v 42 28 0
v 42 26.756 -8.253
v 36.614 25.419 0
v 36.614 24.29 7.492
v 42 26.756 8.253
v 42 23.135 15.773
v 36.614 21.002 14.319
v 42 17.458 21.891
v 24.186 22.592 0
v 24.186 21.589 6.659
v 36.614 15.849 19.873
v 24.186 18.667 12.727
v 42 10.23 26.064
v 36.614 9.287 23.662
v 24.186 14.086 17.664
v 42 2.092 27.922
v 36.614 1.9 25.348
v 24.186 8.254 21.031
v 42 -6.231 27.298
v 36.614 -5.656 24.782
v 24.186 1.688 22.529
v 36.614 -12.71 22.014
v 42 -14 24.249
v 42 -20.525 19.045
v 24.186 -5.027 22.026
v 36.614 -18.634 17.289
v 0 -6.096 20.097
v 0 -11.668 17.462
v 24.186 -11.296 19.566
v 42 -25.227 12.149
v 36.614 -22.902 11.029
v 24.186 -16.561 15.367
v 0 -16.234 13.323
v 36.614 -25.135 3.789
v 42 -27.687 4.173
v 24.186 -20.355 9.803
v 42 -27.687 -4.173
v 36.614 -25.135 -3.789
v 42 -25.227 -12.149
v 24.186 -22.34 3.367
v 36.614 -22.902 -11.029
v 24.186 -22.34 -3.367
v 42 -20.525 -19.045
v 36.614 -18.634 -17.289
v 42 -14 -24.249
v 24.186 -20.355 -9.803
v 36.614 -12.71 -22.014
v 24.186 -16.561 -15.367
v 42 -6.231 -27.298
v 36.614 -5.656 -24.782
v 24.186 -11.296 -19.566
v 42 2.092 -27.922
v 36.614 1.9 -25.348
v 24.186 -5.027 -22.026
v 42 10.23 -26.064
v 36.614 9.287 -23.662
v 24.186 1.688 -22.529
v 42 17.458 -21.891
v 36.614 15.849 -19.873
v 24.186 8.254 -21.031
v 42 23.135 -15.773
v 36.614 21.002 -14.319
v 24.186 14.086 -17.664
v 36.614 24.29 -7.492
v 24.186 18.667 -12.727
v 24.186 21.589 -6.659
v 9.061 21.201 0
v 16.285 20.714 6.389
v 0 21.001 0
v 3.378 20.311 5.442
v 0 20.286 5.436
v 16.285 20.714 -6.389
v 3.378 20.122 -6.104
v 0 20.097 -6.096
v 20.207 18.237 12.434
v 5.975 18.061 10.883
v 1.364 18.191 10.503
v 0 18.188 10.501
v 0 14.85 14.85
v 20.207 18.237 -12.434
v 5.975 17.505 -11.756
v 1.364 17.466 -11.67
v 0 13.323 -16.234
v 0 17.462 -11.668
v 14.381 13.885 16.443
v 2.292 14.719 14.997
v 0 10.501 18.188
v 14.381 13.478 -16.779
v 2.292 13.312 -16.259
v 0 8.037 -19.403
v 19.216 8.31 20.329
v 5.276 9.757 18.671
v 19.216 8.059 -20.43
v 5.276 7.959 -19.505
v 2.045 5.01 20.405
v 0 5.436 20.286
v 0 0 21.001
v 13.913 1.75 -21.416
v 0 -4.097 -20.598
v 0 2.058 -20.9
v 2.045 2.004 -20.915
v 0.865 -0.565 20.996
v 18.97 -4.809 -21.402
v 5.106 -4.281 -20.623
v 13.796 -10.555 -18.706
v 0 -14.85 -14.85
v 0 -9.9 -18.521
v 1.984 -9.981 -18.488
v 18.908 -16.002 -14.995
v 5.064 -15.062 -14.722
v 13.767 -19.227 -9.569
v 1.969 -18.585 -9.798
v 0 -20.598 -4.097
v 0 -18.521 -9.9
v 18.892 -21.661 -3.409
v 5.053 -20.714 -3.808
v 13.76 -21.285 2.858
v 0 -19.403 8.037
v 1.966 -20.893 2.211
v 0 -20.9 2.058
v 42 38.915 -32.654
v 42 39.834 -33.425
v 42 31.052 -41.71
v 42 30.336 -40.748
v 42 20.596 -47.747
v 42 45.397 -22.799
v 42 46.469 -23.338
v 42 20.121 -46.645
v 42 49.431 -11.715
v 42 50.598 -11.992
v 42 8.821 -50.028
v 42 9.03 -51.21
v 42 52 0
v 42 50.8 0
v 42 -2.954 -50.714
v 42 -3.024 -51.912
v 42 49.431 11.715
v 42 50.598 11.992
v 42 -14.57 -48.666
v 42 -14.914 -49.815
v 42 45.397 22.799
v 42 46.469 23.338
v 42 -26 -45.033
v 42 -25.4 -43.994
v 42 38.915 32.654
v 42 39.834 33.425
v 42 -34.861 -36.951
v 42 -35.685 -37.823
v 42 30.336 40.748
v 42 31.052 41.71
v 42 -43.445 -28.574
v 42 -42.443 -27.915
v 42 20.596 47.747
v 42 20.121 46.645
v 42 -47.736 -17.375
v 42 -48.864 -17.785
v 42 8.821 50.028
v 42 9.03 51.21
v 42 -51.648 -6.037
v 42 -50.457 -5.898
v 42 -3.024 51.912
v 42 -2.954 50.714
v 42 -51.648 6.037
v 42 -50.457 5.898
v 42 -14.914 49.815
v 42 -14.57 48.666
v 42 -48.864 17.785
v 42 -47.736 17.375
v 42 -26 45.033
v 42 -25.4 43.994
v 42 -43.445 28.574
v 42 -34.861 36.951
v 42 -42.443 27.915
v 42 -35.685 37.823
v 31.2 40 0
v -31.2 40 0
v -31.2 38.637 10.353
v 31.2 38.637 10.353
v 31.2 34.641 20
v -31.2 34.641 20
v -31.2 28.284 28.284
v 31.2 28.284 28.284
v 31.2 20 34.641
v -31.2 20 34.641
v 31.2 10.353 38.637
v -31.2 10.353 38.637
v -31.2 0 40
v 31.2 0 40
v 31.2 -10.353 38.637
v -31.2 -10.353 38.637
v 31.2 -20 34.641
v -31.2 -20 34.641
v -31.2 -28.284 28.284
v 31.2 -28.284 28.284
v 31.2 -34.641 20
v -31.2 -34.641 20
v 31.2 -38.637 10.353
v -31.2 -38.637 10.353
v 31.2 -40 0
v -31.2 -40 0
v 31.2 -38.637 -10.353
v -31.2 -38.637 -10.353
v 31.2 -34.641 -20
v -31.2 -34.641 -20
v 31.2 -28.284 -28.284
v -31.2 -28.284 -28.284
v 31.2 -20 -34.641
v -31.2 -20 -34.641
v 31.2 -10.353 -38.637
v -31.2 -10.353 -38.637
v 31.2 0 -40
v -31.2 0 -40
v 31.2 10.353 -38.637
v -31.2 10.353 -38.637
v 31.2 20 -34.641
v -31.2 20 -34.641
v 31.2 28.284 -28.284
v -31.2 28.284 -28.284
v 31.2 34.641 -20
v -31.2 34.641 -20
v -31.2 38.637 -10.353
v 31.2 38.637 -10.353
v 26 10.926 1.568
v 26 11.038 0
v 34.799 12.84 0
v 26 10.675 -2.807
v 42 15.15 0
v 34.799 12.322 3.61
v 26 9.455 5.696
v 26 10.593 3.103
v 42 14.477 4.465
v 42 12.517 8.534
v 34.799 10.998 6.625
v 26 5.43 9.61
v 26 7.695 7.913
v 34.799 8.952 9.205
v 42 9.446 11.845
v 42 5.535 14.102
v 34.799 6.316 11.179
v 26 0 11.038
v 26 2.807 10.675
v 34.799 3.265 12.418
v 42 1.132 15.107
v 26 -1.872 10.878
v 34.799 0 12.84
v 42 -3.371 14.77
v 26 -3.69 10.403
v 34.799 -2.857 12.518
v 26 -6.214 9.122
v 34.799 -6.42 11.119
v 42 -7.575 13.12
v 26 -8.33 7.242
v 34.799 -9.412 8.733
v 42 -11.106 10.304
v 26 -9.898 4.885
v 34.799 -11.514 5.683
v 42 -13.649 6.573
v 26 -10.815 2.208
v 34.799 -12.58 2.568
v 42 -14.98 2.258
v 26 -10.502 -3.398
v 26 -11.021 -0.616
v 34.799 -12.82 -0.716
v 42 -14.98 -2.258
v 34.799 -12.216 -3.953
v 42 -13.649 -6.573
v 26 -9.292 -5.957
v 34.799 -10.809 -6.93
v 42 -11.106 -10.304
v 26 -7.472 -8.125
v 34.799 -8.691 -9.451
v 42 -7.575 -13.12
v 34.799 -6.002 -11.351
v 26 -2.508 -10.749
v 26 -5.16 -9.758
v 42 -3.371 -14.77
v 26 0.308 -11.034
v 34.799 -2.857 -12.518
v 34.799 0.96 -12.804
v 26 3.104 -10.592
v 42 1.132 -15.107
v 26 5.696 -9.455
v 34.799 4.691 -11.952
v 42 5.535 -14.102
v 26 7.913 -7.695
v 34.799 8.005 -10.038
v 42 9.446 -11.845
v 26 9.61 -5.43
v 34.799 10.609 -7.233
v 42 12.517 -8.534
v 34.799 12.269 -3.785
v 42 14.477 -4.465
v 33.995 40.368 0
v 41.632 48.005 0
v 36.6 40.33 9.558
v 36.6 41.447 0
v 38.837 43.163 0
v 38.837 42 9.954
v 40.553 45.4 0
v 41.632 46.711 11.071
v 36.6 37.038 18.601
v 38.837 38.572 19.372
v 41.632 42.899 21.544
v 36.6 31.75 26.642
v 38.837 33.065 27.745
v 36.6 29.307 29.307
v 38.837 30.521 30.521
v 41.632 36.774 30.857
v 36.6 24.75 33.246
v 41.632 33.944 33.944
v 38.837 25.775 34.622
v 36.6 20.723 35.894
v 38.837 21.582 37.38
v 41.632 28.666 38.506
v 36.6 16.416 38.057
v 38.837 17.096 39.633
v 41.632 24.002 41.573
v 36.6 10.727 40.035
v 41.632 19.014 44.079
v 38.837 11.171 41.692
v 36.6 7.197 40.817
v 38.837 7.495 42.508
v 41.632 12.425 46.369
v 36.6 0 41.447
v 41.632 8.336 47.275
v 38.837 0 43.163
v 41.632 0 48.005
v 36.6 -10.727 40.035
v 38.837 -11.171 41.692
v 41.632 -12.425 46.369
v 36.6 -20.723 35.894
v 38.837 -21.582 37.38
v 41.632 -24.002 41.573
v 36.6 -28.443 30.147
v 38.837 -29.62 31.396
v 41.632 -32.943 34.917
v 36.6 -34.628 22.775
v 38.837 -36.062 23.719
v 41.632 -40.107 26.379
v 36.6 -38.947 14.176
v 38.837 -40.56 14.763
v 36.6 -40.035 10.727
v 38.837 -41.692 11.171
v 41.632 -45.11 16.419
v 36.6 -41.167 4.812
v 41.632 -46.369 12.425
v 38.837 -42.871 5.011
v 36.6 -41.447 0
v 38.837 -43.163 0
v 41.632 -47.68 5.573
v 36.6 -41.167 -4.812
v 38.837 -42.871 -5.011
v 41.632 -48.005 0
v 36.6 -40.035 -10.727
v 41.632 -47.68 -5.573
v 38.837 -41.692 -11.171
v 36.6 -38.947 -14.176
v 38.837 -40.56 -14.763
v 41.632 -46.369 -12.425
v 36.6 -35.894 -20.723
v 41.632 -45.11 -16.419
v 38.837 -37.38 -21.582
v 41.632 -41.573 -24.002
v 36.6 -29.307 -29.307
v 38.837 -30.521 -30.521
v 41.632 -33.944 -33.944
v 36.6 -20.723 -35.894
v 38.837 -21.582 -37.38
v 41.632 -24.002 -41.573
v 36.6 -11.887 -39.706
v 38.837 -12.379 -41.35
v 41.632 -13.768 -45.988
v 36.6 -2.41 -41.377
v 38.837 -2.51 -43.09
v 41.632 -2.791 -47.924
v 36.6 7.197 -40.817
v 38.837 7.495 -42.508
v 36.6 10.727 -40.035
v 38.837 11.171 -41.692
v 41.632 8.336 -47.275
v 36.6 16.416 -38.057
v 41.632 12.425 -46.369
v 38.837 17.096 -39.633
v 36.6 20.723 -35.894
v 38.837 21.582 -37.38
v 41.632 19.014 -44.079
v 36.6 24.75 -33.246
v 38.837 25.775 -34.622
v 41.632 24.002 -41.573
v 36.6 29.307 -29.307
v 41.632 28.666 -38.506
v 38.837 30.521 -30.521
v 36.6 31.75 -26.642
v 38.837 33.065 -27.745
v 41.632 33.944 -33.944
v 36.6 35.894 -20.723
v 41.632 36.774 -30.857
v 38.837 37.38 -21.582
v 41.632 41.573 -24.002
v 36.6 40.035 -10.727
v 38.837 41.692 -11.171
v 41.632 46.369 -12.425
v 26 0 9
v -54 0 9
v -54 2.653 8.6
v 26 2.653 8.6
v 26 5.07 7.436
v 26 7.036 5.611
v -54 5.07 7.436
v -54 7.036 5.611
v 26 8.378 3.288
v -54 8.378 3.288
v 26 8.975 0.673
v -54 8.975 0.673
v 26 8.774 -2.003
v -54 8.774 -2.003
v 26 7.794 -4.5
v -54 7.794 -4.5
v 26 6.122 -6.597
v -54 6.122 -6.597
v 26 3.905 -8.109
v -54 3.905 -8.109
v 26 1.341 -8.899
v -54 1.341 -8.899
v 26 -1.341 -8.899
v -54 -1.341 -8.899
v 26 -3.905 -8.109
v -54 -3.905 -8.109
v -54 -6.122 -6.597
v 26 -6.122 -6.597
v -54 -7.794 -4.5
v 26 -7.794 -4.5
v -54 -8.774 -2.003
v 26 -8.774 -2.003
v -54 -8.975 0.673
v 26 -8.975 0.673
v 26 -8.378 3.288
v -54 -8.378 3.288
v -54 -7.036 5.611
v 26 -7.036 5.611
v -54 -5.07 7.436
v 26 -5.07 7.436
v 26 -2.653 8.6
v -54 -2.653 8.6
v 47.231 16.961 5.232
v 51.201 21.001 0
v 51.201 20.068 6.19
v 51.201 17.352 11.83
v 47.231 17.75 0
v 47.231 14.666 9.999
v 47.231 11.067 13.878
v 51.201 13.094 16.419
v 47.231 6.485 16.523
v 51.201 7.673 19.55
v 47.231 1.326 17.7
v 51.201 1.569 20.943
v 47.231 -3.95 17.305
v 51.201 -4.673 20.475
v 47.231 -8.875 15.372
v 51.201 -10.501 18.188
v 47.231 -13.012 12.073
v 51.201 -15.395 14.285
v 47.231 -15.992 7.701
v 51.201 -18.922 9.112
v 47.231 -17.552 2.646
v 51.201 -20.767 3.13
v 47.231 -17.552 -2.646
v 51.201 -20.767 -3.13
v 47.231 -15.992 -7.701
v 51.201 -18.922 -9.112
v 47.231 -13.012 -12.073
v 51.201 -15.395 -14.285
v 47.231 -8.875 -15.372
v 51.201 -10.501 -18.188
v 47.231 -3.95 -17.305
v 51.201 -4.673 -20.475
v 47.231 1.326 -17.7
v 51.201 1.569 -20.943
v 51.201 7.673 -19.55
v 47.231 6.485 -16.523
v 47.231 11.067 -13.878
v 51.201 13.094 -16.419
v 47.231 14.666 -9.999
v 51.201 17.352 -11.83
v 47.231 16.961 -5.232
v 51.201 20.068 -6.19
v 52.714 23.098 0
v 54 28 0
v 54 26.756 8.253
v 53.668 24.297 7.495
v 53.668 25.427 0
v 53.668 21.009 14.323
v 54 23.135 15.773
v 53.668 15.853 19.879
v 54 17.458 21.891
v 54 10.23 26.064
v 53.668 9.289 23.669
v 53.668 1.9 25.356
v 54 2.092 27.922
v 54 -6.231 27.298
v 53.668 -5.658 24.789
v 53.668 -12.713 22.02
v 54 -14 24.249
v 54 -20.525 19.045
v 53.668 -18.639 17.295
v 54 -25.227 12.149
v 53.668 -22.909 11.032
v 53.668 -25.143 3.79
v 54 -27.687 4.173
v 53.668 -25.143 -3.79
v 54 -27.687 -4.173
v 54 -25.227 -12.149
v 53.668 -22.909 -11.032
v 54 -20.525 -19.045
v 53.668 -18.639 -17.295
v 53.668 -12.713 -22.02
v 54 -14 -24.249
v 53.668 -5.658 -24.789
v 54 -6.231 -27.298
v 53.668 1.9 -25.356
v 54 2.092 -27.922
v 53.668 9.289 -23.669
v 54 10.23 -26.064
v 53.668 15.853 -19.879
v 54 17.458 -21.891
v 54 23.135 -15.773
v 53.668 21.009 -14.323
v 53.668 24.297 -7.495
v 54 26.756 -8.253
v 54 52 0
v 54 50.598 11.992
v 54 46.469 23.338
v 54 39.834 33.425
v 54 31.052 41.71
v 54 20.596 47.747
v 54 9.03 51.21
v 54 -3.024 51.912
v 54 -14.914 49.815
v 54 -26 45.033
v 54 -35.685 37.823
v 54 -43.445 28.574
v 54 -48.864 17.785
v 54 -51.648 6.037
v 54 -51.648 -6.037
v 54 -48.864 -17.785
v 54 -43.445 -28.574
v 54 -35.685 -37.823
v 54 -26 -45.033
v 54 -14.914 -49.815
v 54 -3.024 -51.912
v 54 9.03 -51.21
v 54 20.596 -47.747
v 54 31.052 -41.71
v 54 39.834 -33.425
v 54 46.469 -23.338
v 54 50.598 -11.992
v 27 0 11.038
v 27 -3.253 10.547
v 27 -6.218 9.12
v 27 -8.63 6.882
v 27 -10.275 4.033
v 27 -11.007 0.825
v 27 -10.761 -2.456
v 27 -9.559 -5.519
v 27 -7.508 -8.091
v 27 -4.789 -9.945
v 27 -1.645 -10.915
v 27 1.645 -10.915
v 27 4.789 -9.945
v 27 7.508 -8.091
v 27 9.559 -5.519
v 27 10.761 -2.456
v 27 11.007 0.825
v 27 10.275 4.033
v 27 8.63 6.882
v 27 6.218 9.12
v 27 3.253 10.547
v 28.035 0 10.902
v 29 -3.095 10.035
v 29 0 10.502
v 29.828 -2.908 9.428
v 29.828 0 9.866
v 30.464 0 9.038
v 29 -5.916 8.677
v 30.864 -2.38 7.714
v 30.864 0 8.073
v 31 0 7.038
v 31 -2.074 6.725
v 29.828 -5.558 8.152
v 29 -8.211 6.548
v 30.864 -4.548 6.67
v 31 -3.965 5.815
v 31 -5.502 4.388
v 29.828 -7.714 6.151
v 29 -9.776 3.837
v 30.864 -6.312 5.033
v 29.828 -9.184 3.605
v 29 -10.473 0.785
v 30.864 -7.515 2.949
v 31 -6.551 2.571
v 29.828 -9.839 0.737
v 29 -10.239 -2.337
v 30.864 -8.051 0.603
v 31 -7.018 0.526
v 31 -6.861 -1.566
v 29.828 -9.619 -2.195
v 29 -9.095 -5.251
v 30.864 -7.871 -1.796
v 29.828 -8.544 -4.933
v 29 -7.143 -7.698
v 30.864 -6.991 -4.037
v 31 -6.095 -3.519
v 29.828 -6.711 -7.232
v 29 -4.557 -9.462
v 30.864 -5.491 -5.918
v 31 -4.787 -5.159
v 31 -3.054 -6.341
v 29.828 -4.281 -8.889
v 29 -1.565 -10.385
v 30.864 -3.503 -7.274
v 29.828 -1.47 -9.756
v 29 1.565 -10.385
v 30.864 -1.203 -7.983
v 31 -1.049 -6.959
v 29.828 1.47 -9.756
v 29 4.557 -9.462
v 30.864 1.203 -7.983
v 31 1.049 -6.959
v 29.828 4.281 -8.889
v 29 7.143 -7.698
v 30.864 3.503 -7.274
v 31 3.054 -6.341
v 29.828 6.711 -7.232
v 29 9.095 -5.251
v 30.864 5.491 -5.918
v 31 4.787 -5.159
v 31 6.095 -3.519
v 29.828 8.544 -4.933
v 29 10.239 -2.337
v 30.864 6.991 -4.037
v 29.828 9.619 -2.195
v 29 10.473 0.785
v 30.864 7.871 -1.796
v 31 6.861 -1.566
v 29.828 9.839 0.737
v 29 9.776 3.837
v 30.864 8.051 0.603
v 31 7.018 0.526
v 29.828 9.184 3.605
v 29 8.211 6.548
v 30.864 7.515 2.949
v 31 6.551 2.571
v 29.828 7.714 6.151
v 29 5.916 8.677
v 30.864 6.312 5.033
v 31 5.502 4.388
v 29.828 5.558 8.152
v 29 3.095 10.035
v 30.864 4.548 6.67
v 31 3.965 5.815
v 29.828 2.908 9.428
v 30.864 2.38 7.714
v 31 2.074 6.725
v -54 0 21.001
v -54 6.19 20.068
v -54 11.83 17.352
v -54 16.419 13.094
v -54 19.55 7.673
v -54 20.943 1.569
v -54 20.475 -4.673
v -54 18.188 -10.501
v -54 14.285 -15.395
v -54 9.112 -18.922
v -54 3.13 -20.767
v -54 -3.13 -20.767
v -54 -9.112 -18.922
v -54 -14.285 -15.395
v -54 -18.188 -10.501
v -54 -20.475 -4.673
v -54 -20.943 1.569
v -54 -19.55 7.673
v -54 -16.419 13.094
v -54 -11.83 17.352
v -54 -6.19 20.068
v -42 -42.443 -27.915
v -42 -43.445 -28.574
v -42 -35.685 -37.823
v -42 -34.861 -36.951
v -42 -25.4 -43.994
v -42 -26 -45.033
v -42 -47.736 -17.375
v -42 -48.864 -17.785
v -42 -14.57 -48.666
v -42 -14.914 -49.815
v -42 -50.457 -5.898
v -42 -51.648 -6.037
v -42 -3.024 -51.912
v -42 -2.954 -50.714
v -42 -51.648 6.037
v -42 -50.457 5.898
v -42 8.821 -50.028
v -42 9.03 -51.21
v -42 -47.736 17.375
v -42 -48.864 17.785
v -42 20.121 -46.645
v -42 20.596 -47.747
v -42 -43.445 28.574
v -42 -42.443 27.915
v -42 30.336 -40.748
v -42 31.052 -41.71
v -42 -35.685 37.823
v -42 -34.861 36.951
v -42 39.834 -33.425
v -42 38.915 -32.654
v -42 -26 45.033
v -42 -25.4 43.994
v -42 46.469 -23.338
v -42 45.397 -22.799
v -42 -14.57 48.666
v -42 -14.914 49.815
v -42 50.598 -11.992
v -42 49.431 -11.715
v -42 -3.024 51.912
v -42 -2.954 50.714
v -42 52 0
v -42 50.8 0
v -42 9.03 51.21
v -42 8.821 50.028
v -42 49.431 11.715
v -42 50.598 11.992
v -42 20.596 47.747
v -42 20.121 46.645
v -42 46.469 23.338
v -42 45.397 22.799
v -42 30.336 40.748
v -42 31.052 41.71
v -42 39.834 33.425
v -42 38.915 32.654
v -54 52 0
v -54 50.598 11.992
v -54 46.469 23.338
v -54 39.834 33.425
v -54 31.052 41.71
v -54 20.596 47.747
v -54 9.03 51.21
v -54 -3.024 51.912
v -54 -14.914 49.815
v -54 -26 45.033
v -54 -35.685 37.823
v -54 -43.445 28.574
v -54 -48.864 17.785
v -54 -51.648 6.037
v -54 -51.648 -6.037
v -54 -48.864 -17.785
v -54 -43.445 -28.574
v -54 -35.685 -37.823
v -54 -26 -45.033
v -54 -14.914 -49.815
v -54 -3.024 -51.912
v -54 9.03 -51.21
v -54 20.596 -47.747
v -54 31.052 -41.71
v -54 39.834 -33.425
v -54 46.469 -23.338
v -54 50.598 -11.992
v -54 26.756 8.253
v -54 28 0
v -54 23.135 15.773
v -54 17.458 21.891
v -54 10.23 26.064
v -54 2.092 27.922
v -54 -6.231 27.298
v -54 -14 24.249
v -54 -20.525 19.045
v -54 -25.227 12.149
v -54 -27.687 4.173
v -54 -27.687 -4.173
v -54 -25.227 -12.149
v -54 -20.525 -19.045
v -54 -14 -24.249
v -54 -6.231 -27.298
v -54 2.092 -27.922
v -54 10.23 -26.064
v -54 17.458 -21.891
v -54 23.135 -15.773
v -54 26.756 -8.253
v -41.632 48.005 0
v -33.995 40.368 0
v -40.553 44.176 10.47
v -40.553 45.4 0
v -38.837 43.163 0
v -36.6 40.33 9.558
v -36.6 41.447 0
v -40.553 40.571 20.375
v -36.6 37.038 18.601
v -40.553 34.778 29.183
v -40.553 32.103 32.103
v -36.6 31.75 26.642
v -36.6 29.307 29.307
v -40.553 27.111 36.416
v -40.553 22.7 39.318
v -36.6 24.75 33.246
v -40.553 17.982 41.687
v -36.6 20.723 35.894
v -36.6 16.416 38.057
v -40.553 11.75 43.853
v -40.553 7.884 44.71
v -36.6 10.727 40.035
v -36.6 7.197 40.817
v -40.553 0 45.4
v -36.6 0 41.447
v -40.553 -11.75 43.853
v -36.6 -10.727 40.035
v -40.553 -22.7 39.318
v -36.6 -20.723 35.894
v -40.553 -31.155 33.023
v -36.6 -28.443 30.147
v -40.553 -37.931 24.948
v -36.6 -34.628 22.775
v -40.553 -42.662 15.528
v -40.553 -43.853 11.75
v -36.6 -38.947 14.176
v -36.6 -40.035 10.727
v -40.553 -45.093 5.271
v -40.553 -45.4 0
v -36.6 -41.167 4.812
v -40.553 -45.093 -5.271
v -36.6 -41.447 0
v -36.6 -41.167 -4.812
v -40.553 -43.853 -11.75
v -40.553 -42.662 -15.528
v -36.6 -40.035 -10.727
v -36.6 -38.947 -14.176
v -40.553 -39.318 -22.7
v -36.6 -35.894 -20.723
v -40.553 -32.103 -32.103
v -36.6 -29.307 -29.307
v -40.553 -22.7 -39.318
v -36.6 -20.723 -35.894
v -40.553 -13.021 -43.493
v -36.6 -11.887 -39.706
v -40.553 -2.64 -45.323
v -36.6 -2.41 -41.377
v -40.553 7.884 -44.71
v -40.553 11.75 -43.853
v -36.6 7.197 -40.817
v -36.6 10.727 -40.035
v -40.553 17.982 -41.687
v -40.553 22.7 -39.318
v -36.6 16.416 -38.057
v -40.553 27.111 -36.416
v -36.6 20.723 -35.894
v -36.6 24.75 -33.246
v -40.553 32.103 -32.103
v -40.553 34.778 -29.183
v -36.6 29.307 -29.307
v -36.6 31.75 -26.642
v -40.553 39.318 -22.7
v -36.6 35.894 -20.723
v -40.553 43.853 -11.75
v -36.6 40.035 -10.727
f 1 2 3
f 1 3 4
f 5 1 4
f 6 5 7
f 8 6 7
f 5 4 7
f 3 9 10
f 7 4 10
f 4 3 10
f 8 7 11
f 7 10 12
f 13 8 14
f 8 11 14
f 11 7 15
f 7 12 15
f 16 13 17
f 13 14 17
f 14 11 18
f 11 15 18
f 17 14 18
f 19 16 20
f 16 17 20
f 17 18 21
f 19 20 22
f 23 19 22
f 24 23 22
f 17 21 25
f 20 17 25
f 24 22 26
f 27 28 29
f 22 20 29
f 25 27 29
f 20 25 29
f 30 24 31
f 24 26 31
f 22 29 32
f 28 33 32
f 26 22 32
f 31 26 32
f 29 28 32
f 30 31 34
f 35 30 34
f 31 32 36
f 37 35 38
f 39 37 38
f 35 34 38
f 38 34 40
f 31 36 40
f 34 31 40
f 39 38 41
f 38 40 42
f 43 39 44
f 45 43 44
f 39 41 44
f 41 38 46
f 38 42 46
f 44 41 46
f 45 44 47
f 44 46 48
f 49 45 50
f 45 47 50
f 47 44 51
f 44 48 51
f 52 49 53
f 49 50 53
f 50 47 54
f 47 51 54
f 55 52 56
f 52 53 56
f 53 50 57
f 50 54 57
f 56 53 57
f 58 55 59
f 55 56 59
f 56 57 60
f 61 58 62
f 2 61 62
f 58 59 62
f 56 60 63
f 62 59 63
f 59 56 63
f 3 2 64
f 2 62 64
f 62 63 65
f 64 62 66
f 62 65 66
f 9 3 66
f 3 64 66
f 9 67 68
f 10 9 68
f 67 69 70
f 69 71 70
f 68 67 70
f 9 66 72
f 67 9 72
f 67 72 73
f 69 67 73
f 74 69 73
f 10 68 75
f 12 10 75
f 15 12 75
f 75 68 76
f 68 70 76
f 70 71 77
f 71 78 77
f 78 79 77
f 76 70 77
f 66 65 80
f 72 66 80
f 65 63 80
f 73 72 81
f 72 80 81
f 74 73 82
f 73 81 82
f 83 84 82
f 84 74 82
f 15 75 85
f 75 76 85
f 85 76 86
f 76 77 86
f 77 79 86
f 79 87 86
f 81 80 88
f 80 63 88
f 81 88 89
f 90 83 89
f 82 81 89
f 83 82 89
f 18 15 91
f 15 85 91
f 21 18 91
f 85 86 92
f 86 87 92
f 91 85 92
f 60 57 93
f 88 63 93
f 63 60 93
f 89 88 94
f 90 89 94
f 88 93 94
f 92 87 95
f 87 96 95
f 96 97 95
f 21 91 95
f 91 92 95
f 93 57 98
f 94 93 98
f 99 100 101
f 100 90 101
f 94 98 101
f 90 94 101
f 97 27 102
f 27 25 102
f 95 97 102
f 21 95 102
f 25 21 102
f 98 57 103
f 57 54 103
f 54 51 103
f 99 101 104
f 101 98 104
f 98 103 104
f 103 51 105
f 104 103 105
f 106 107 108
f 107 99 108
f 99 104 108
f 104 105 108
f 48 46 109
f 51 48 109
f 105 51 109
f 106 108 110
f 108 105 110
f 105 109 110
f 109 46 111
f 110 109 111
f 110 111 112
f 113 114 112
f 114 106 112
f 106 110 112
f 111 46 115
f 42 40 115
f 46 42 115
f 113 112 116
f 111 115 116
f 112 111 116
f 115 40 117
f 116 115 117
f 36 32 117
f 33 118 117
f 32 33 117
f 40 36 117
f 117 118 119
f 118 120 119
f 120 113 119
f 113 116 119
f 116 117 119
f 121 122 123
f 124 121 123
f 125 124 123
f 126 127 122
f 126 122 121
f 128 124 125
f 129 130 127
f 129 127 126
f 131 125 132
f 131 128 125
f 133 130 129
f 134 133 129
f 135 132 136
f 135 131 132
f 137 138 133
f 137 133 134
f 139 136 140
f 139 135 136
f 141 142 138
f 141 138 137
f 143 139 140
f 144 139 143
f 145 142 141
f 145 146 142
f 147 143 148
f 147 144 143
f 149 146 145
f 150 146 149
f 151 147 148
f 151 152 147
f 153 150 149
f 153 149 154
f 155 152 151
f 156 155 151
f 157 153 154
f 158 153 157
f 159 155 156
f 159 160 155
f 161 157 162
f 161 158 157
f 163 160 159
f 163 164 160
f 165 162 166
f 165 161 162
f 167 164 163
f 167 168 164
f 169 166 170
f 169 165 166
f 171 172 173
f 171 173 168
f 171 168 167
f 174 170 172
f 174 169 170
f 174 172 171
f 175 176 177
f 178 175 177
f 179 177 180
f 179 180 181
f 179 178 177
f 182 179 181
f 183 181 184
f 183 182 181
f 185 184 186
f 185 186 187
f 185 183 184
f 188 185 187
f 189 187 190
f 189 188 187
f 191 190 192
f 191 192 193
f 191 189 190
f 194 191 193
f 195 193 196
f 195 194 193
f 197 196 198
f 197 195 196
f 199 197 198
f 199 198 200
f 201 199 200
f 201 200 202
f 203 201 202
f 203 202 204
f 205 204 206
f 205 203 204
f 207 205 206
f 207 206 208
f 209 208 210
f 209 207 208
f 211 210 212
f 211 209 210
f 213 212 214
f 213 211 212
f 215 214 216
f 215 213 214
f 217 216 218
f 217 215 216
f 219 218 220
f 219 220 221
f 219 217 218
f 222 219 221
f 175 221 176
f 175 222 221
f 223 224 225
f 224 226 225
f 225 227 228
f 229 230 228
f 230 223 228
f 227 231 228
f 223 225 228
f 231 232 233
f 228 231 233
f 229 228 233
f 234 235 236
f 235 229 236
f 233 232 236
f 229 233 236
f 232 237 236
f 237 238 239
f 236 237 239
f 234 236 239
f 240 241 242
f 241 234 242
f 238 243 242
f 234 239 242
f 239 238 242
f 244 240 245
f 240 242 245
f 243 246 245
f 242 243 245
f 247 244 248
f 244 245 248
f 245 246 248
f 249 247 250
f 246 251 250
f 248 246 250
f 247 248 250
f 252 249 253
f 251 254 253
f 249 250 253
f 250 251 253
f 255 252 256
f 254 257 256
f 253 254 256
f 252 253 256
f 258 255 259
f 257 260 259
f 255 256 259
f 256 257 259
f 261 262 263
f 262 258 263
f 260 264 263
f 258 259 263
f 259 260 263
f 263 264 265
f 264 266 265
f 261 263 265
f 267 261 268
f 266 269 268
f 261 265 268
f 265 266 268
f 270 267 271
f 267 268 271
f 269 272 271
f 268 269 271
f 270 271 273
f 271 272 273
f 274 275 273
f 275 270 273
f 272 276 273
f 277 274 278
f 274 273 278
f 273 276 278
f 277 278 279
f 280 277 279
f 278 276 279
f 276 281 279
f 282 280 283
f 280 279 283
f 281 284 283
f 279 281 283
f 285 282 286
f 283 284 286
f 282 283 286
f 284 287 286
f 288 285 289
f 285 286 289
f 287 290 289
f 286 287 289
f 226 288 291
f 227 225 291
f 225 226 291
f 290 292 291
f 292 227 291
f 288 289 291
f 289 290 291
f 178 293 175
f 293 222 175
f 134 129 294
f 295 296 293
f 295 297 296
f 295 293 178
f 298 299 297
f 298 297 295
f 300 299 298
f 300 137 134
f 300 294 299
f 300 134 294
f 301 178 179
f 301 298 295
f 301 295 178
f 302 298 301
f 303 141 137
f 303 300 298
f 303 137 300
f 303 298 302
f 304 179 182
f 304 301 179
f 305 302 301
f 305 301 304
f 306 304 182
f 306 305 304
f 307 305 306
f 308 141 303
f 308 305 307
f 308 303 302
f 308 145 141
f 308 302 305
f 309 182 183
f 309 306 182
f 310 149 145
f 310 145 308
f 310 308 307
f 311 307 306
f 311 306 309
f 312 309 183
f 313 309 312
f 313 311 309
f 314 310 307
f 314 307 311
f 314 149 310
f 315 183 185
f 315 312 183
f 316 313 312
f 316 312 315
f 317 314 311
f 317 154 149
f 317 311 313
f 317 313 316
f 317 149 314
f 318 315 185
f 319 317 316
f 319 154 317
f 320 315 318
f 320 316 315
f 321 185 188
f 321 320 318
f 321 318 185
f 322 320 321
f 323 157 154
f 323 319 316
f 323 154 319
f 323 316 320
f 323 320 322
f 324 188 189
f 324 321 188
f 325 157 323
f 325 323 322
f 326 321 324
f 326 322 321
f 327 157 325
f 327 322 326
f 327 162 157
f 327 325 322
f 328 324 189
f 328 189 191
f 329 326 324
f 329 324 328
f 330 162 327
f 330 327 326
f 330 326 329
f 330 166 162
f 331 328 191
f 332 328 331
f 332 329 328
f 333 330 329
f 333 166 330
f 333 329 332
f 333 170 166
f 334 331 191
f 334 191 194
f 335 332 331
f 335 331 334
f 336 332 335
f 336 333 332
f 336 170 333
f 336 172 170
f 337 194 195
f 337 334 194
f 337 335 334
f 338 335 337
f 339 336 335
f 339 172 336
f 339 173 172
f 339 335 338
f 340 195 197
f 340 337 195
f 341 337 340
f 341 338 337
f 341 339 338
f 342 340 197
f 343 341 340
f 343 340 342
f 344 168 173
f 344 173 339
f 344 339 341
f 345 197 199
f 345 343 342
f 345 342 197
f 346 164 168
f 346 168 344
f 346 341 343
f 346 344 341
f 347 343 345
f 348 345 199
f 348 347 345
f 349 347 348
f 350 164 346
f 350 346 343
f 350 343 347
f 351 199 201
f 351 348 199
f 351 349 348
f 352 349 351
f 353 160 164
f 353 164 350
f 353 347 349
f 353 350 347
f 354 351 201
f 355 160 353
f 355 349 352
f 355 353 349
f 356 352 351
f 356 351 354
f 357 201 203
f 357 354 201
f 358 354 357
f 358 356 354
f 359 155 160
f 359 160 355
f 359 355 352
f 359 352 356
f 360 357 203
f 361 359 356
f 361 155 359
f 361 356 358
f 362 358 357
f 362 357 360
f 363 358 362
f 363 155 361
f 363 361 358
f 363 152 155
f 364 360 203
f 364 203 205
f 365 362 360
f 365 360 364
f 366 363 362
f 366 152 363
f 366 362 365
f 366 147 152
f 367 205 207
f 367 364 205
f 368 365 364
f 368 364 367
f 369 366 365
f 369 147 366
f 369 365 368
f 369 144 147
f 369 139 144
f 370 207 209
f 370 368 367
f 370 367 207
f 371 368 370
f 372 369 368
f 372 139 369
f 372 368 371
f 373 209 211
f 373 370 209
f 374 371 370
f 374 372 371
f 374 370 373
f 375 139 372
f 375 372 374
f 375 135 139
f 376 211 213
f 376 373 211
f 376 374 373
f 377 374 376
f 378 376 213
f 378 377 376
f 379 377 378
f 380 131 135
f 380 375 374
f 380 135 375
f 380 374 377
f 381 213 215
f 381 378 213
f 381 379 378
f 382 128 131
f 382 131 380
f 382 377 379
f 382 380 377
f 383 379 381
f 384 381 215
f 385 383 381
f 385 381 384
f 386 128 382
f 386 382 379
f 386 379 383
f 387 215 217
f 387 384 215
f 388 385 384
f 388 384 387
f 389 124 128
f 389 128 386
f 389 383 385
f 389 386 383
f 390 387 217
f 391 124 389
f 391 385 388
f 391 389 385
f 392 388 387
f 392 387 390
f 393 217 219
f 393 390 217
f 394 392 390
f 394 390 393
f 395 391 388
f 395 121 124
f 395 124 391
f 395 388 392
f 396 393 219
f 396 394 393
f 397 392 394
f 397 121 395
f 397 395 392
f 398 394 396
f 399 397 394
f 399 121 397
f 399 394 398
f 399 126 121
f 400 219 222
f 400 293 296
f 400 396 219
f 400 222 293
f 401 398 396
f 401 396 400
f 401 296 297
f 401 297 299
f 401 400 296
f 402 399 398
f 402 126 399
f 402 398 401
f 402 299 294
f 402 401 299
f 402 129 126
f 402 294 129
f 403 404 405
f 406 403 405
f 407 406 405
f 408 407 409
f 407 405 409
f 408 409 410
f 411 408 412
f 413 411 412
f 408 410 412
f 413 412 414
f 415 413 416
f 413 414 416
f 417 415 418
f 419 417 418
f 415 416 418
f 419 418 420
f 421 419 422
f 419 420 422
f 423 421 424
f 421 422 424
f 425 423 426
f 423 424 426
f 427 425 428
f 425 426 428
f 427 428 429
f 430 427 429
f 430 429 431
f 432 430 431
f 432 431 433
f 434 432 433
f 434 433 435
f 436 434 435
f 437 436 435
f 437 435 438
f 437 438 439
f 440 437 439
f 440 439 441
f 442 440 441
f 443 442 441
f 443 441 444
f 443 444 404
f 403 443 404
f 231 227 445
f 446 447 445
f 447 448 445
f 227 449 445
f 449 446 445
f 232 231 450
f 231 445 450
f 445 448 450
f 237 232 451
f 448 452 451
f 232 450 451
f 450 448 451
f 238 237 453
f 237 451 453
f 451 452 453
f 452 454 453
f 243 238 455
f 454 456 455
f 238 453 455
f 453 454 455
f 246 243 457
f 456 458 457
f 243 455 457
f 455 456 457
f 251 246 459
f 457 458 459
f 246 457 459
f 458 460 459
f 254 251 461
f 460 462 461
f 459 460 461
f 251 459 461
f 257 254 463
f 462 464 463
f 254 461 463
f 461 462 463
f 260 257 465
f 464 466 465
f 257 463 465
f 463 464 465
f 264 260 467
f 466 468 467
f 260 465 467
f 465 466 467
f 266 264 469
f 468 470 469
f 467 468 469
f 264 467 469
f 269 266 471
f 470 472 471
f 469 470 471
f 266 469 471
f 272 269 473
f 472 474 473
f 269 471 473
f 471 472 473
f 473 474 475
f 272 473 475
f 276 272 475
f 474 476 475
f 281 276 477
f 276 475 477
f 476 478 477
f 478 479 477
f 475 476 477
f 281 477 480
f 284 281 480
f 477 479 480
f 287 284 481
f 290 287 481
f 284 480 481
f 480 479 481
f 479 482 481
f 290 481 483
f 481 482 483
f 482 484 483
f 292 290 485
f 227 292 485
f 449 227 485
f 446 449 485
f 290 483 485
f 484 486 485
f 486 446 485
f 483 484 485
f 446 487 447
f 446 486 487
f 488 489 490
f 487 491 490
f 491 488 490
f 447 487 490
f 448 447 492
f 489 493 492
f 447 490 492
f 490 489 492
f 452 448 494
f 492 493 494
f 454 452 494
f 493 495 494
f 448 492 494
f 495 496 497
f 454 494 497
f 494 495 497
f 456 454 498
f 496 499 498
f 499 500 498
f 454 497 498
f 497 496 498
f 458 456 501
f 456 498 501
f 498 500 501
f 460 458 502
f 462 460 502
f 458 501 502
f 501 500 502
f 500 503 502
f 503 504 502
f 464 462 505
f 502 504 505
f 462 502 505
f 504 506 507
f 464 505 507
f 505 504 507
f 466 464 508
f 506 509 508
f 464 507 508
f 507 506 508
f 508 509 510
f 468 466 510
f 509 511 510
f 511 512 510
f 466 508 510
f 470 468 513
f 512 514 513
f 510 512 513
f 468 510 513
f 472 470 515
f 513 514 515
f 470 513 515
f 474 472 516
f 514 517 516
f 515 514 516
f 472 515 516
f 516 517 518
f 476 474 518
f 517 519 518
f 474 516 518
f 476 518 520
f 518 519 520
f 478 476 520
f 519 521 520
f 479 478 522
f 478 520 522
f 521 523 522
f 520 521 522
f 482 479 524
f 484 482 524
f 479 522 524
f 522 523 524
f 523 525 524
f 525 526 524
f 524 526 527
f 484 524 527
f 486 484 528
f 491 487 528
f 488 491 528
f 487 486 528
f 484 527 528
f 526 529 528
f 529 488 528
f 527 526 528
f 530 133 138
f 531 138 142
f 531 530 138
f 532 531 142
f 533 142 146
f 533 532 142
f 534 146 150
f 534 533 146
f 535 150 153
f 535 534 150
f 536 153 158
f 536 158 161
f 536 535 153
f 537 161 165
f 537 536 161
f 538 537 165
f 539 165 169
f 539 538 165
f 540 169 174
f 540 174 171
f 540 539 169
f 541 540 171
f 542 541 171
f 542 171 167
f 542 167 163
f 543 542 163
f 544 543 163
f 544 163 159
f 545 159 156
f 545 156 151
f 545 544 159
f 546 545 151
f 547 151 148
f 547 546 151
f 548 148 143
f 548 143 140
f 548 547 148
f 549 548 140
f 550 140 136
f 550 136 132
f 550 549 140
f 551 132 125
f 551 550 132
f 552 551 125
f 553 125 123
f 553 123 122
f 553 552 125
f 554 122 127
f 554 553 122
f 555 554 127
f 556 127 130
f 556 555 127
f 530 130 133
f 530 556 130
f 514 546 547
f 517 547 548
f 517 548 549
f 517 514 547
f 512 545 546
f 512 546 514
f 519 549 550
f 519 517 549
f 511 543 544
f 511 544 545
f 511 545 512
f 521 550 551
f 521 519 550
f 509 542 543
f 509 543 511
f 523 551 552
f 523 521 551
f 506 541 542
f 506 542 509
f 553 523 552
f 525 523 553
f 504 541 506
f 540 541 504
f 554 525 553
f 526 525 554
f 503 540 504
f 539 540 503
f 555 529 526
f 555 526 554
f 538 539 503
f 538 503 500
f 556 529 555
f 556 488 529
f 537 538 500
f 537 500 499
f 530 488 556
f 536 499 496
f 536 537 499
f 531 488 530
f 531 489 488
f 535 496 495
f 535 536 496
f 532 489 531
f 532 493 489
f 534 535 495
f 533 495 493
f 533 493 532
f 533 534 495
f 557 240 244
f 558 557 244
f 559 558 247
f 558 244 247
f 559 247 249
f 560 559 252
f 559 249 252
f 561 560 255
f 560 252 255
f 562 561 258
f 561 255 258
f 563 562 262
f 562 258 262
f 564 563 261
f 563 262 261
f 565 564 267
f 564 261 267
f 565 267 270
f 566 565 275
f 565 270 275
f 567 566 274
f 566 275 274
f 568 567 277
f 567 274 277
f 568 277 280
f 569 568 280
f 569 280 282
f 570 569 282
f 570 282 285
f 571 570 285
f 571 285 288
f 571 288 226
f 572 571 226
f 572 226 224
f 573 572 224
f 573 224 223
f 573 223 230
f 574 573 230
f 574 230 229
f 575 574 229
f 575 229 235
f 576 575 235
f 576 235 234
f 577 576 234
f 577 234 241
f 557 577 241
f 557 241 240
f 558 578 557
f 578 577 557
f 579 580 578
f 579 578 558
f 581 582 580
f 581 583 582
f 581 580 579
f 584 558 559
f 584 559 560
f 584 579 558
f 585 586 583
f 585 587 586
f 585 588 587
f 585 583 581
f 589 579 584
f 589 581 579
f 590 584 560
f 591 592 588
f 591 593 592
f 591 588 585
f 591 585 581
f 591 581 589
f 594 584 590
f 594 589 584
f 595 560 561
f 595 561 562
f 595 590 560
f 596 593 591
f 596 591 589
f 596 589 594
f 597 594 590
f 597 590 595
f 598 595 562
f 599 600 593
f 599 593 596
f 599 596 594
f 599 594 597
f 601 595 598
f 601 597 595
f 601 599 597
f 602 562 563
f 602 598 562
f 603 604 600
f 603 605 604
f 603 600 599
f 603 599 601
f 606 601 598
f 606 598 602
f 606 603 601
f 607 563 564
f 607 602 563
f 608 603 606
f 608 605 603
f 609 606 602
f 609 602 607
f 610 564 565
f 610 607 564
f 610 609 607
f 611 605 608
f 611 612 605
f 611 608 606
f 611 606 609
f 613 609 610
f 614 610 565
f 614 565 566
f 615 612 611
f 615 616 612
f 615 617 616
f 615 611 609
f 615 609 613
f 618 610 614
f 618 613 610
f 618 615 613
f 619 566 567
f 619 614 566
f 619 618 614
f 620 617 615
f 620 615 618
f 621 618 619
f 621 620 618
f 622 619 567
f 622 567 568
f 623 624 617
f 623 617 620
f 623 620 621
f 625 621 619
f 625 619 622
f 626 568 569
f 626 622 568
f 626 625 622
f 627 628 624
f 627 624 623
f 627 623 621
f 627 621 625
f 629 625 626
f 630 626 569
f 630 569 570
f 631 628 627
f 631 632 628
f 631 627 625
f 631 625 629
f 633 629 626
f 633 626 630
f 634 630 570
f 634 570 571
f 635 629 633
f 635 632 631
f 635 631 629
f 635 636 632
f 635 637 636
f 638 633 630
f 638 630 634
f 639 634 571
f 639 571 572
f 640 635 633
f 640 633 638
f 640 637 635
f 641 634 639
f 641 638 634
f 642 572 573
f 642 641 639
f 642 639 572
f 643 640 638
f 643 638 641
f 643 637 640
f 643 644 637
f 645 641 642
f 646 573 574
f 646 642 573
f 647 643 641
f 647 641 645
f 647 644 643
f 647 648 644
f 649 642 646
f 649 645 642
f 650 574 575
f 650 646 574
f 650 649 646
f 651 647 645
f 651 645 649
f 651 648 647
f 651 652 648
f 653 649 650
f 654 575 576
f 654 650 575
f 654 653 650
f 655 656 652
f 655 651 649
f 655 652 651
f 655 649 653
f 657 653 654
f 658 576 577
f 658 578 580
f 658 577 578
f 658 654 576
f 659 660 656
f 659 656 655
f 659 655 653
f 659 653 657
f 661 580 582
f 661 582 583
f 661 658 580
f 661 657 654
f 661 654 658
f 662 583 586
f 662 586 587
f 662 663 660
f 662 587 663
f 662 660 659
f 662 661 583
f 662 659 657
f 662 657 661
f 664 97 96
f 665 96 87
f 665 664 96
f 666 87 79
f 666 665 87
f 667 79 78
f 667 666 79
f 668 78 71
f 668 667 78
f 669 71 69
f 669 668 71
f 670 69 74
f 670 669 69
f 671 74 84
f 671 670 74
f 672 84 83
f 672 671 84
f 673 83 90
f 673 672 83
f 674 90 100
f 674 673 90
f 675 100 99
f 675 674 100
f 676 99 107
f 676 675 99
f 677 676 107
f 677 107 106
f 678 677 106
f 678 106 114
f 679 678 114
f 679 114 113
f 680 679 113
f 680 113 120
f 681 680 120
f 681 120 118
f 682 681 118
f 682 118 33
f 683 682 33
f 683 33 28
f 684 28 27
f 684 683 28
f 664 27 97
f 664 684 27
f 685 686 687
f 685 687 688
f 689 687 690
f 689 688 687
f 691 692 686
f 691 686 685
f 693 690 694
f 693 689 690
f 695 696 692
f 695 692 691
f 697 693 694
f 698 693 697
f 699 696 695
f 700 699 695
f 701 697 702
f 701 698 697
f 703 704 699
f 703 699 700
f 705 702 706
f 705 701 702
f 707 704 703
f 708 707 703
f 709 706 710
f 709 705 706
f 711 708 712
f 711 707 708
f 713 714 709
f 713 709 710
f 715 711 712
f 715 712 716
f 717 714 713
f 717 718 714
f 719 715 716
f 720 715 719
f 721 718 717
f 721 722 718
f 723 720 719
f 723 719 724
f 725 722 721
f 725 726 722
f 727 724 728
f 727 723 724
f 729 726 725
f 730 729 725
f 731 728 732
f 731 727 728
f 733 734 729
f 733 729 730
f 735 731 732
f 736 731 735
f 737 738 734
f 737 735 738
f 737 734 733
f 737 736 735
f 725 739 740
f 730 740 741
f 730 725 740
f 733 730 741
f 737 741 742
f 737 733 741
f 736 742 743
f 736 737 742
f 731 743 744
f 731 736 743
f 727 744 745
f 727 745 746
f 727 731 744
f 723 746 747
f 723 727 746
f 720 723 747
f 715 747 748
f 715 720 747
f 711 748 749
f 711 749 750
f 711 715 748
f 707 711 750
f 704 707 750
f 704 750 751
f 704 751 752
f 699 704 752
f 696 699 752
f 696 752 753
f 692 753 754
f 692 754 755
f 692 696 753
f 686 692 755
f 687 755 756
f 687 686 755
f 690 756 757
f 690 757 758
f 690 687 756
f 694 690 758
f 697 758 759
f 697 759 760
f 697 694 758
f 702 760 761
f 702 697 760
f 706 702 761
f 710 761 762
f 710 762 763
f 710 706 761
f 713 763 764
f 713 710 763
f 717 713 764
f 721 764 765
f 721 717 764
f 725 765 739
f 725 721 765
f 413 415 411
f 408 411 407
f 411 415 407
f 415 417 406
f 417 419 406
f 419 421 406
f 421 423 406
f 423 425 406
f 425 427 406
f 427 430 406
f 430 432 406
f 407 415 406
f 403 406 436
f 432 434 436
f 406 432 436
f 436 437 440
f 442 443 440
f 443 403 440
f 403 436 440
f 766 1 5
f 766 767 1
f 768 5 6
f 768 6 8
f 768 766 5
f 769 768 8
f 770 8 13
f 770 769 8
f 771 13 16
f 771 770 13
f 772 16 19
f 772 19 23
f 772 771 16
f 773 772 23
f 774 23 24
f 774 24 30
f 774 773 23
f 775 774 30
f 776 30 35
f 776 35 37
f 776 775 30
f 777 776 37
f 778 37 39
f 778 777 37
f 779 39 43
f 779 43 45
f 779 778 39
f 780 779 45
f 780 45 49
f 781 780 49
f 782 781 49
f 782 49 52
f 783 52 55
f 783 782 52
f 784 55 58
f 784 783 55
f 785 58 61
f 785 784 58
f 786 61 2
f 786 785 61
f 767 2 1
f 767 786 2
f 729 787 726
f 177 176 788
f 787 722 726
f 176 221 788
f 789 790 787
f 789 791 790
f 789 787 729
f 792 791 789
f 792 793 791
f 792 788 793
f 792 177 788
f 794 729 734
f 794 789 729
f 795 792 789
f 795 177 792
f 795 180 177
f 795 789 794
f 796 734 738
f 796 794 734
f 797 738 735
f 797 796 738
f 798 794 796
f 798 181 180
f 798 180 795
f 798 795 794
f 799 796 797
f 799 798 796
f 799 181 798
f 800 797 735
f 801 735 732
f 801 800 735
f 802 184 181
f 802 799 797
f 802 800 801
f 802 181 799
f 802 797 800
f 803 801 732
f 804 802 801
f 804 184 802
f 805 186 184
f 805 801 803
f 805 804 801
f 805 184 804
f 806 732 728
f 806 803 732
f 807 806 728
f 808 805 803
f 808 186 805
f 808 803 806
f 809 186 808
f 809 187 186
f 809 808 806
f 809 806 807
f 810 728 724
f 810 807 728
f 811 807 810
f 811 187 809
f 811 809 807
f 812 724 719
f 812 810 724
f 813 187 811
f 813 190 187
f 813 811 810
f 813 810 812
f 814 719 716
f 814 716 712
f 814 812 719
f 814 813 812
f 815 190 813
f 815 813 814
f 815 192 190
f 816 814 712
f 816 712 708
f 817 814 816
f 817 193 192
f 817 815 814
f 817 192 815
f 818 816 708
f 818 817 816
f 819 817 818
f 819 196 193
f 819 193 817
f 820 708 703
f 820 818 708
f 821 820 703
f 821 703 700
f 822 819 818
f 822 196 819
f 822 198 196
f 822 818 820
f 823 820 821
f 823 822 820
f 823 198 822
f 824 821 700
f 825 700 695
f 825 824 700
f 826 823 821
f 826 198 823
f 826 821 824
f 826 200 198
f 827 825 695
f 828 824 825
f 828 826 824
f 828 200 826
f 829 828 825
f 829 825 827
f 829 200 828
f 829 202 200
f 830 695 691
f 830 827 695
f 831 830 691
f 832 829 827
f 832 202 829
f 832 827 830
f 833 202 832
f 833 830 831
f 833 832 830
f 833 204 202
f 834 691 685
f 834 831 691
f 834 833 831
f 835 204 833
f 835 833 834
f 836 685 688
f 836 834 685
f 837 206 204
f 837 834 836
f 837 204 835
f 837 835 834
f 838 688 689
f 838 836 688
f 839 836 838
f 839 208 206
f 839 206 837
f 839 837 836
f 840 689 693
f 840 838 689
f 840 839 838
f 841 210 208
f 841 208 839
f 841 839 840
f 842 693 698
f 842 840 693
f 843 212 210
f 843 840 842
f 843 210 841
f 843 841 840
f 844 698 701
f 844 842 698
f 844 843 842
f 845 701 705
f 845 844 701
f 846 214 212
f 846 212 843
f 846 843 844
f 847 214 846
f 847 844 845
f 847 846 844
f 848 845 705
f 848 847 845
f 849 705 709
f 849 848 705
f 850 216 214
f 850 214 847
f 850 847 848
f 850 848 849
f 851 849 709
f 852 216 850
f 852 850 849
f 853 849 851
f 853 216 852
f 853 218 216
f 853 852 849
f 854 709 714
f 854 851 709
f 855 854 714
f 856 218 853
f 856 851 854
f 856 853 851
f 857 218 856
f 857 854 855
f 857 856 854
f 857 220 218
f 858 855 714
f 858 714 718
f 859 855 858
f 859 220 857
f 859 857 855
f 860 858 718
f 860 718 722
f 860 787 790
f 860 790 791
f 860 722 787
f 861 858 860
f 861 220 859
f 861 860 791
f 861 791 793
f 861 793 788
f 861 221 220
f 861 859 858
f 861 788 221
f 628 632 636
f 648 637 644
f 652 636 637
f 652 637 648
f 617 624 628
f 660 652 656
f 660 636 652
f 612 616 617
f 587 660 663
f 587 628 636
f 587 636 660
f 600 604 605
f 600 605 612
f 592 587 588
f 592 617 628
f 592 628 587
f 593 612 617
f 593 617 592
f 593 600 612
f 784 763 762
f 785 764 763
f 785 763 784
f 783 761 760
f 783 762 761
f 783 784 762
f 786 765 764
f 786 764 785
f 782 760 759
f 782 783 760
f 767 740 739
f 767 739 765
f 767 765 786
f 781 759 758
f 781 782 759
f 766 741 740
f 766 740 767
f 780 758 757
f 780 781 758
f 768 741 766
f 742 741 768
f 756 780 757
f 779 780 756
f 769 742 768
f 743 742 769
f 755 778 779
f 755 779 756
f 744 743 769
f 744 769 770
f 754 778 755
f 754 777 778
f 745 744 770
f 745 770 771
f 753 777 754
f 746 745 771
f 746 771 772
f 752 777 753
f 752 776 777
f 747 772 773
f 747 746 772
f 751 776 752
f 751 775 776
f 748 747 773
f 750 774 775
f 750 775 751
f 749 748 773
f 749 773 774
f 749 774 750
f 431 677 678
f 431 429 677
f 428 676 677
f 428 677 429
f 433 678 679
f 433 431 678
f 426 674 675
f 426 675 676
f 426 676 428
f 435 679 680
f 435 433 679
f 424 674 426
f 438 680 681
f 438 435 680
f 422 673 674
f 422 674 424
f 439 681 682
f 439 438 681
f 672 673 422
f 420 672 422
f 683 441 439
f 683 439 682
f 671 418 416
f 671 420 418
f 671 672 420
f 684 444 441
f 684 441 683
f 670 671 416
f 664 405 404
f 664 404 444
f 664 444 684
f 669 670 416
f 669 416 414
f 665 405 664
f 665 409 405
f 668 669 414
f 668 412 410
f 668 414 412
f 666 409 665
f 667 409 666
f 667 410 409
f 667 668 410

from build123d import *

# Parameters (mm, degrees)
R_VOLUTION3_OUTLINE_W = 12
R_VOLUTION3_OUTLINE_H = 12
ESQUISSE2_R           = 21.001288109
ESQUISSE2_R_2         = 9
BOSS_EXTRU_1_DEPTH    = 80
ESQUISSE3_R           = 11.037807833
BOSS_EXTRU_2_DEPTH    = 5
CONG_1_R              = 4


# Read off the part's stored shape, not the designer's step: Révolution3
with BuildPart() as part:
    # Révolution3 outline → Révolution3 (revolve)
    with BuildSketch(Plane.YX):
        with BuildLine():
            add(Edge.make_bspline(
                [(9, 0), (9.053826316, 3.507535605), (9.211693628, 27.185630898), (15.14970787, 42)],
                knots=[0, 0, 0, 0, 0.679566397, 0.679566397, 0.679566397, 0.679566397], degree=3))
            Line((9, 0), (21.001288109, 0))
            Line((21.001288109, 0), (21.001288109, 42))
            Line((21.001288109, 42), (15.14970787, 42))
        make_face()
        with BuildLine():
            add(Edge.make_bspline(
                [(15.14970787, 42), (16.682530626, 45.824140722), (18.600512592, 49.057648401), (21.001288109, 51.201106105)],
                knots=[0.679566397, 0.679566397, 0.679566397, 0.679566397, 0.854987808, 0.854987808, 0.854987808, 0.854987808], degree=3))
            Line((15.14970787, 42), (21.001288109, 42))
            Line((21.001288109, 42), (21.001288109, 51.201106105))
        make_face()
        with BuildLine():
            Line((21.001288109, 42), (21.001288109, 0))
            add(Edge.make_bspline(
                [(28, 42), (27.997779305, 41.997025444), (27.875050115, 41.83237842), (27.609034397, 41.447212382), (27.160528215, 40.690969165), (26.526197616, 39.457776411), (25.708310332, 37.527019057), (24.777928166, 34.714134126), (23.942034299, 31.528478566), (22.978703398, 26.934375104), (22.072778857, 20.805167001), (21.526924747, 14.790080699), (21.257611914, 10.390059795), (21.125442102, 7.378245527), (21.048712817, 4.734783543), (21.018586389, 2.904179393), (21.007225123, 1.69657239), (21.003198587, 0.929954604), (21.001909089, 0.369945076), (21.0015083, 0.102272875), (21.001288109, 0)],
                knots=[0.198795247, 0.198795247, 0.198795247, 0.198795247, 0.199272098, 0.22510203, 0.250931963, 0.276761895, 0.32842176, 0.380081624, 0.431741489, 0.483401354, 0.586721083, 0.690040812, 0.741700677, 0.793360541, 0.845020406, 0.896680271, 0.922510203, 0.948340135, 0.974170068, 0.990325422, 0.990325422, 0.990325422, 0.990325422], degree=3))
            Line((28, 42), (21.001288109, 42))
        make_face()
        with BuildLine():
            add(Edge.make_bspline(
                [(21.001288109, 51.201106105), (22.985890317, 52.972996421), (25.300409981, 54), (28, 54)],
                knots=[0.854987808, 0.854987808, 0.854987808, 0.854987808, 1, 1, 1, 1], degree=3))
            Line((21.001288109, 51.201106105), (21.001288109, 42))
            Line((21.001288109, 42), (28, 42))
            Line((28, 42), (28, 54))
        make_face()
        Polygon((40, 42), (28, 42), (28, 0), (40, 0), (40, 31.2), align=None)
        with Locations((34, 48)):
            Rectangle(R_VOLUTION3_OUTLINE_W, R_VOLUTION3_OUTLINE_H)
        Polygon((40, 0), (28, 0), (28, -54), (40, -54), (40, -31.2), align=None)
        with BuildLine():
            Line((50.8, 42), (40, 42))
            Line((40, 42), (40, 31.2))
            ThreePointArc((40, 31.2), (43.163246763, 38.836753237), (50.8, 42))
        make_face()
        Polygon((40, 54), (40, 42), (50.8, 42), (52, 42), (52, 54), align=None)
        with BuildLine():
            Line((40, -31.2), (40, -54))
            Line((40, -54), (52, -54))
            Line((52, -54), (52, -42))
            Line((52, -42), (50.8, -42))
            ThreePointArc((50.8, -42), (43.163246763, -38.836753237), (40, -31.2))
        make_face()
    revolve(axis=Axis((0, 0, 0), (1, 0, 0)))

    # Esquisse2 → Boss.-Extru.1 (add)
    with BuildSketch(Plane.ZY.offset(54)):
        Circle(ESQUISSE2_R)
        Circle(ESQUISSE2_R_2, mode=Mode.SUBTRACT)
    extrude(amount=-BOSS_EXTRU_1_DEPTH)

    # Esquisse3 → Boss.-Extru.2 (add)
    with BuildSketch(Plane(origin=(26, 0, 0), x_dir=(0, 0, -1), z_dir=(1, 0, 0))):
        with Locations(Location((0, 0, 0), (0, 0, 180))):
            Circle(ESQUISSE3_R)
    extrude(amount=BOSS_EXTRU_2_DEPTH)

    # Congé1
    cong_1_edges = [part.edges().sort_by_distance(p)[0] for p in [
        (31, 0, -11.037807833),
    ]]
    fillet(cong_1_edges, radius=CONG_1_R)


solid = part.part
